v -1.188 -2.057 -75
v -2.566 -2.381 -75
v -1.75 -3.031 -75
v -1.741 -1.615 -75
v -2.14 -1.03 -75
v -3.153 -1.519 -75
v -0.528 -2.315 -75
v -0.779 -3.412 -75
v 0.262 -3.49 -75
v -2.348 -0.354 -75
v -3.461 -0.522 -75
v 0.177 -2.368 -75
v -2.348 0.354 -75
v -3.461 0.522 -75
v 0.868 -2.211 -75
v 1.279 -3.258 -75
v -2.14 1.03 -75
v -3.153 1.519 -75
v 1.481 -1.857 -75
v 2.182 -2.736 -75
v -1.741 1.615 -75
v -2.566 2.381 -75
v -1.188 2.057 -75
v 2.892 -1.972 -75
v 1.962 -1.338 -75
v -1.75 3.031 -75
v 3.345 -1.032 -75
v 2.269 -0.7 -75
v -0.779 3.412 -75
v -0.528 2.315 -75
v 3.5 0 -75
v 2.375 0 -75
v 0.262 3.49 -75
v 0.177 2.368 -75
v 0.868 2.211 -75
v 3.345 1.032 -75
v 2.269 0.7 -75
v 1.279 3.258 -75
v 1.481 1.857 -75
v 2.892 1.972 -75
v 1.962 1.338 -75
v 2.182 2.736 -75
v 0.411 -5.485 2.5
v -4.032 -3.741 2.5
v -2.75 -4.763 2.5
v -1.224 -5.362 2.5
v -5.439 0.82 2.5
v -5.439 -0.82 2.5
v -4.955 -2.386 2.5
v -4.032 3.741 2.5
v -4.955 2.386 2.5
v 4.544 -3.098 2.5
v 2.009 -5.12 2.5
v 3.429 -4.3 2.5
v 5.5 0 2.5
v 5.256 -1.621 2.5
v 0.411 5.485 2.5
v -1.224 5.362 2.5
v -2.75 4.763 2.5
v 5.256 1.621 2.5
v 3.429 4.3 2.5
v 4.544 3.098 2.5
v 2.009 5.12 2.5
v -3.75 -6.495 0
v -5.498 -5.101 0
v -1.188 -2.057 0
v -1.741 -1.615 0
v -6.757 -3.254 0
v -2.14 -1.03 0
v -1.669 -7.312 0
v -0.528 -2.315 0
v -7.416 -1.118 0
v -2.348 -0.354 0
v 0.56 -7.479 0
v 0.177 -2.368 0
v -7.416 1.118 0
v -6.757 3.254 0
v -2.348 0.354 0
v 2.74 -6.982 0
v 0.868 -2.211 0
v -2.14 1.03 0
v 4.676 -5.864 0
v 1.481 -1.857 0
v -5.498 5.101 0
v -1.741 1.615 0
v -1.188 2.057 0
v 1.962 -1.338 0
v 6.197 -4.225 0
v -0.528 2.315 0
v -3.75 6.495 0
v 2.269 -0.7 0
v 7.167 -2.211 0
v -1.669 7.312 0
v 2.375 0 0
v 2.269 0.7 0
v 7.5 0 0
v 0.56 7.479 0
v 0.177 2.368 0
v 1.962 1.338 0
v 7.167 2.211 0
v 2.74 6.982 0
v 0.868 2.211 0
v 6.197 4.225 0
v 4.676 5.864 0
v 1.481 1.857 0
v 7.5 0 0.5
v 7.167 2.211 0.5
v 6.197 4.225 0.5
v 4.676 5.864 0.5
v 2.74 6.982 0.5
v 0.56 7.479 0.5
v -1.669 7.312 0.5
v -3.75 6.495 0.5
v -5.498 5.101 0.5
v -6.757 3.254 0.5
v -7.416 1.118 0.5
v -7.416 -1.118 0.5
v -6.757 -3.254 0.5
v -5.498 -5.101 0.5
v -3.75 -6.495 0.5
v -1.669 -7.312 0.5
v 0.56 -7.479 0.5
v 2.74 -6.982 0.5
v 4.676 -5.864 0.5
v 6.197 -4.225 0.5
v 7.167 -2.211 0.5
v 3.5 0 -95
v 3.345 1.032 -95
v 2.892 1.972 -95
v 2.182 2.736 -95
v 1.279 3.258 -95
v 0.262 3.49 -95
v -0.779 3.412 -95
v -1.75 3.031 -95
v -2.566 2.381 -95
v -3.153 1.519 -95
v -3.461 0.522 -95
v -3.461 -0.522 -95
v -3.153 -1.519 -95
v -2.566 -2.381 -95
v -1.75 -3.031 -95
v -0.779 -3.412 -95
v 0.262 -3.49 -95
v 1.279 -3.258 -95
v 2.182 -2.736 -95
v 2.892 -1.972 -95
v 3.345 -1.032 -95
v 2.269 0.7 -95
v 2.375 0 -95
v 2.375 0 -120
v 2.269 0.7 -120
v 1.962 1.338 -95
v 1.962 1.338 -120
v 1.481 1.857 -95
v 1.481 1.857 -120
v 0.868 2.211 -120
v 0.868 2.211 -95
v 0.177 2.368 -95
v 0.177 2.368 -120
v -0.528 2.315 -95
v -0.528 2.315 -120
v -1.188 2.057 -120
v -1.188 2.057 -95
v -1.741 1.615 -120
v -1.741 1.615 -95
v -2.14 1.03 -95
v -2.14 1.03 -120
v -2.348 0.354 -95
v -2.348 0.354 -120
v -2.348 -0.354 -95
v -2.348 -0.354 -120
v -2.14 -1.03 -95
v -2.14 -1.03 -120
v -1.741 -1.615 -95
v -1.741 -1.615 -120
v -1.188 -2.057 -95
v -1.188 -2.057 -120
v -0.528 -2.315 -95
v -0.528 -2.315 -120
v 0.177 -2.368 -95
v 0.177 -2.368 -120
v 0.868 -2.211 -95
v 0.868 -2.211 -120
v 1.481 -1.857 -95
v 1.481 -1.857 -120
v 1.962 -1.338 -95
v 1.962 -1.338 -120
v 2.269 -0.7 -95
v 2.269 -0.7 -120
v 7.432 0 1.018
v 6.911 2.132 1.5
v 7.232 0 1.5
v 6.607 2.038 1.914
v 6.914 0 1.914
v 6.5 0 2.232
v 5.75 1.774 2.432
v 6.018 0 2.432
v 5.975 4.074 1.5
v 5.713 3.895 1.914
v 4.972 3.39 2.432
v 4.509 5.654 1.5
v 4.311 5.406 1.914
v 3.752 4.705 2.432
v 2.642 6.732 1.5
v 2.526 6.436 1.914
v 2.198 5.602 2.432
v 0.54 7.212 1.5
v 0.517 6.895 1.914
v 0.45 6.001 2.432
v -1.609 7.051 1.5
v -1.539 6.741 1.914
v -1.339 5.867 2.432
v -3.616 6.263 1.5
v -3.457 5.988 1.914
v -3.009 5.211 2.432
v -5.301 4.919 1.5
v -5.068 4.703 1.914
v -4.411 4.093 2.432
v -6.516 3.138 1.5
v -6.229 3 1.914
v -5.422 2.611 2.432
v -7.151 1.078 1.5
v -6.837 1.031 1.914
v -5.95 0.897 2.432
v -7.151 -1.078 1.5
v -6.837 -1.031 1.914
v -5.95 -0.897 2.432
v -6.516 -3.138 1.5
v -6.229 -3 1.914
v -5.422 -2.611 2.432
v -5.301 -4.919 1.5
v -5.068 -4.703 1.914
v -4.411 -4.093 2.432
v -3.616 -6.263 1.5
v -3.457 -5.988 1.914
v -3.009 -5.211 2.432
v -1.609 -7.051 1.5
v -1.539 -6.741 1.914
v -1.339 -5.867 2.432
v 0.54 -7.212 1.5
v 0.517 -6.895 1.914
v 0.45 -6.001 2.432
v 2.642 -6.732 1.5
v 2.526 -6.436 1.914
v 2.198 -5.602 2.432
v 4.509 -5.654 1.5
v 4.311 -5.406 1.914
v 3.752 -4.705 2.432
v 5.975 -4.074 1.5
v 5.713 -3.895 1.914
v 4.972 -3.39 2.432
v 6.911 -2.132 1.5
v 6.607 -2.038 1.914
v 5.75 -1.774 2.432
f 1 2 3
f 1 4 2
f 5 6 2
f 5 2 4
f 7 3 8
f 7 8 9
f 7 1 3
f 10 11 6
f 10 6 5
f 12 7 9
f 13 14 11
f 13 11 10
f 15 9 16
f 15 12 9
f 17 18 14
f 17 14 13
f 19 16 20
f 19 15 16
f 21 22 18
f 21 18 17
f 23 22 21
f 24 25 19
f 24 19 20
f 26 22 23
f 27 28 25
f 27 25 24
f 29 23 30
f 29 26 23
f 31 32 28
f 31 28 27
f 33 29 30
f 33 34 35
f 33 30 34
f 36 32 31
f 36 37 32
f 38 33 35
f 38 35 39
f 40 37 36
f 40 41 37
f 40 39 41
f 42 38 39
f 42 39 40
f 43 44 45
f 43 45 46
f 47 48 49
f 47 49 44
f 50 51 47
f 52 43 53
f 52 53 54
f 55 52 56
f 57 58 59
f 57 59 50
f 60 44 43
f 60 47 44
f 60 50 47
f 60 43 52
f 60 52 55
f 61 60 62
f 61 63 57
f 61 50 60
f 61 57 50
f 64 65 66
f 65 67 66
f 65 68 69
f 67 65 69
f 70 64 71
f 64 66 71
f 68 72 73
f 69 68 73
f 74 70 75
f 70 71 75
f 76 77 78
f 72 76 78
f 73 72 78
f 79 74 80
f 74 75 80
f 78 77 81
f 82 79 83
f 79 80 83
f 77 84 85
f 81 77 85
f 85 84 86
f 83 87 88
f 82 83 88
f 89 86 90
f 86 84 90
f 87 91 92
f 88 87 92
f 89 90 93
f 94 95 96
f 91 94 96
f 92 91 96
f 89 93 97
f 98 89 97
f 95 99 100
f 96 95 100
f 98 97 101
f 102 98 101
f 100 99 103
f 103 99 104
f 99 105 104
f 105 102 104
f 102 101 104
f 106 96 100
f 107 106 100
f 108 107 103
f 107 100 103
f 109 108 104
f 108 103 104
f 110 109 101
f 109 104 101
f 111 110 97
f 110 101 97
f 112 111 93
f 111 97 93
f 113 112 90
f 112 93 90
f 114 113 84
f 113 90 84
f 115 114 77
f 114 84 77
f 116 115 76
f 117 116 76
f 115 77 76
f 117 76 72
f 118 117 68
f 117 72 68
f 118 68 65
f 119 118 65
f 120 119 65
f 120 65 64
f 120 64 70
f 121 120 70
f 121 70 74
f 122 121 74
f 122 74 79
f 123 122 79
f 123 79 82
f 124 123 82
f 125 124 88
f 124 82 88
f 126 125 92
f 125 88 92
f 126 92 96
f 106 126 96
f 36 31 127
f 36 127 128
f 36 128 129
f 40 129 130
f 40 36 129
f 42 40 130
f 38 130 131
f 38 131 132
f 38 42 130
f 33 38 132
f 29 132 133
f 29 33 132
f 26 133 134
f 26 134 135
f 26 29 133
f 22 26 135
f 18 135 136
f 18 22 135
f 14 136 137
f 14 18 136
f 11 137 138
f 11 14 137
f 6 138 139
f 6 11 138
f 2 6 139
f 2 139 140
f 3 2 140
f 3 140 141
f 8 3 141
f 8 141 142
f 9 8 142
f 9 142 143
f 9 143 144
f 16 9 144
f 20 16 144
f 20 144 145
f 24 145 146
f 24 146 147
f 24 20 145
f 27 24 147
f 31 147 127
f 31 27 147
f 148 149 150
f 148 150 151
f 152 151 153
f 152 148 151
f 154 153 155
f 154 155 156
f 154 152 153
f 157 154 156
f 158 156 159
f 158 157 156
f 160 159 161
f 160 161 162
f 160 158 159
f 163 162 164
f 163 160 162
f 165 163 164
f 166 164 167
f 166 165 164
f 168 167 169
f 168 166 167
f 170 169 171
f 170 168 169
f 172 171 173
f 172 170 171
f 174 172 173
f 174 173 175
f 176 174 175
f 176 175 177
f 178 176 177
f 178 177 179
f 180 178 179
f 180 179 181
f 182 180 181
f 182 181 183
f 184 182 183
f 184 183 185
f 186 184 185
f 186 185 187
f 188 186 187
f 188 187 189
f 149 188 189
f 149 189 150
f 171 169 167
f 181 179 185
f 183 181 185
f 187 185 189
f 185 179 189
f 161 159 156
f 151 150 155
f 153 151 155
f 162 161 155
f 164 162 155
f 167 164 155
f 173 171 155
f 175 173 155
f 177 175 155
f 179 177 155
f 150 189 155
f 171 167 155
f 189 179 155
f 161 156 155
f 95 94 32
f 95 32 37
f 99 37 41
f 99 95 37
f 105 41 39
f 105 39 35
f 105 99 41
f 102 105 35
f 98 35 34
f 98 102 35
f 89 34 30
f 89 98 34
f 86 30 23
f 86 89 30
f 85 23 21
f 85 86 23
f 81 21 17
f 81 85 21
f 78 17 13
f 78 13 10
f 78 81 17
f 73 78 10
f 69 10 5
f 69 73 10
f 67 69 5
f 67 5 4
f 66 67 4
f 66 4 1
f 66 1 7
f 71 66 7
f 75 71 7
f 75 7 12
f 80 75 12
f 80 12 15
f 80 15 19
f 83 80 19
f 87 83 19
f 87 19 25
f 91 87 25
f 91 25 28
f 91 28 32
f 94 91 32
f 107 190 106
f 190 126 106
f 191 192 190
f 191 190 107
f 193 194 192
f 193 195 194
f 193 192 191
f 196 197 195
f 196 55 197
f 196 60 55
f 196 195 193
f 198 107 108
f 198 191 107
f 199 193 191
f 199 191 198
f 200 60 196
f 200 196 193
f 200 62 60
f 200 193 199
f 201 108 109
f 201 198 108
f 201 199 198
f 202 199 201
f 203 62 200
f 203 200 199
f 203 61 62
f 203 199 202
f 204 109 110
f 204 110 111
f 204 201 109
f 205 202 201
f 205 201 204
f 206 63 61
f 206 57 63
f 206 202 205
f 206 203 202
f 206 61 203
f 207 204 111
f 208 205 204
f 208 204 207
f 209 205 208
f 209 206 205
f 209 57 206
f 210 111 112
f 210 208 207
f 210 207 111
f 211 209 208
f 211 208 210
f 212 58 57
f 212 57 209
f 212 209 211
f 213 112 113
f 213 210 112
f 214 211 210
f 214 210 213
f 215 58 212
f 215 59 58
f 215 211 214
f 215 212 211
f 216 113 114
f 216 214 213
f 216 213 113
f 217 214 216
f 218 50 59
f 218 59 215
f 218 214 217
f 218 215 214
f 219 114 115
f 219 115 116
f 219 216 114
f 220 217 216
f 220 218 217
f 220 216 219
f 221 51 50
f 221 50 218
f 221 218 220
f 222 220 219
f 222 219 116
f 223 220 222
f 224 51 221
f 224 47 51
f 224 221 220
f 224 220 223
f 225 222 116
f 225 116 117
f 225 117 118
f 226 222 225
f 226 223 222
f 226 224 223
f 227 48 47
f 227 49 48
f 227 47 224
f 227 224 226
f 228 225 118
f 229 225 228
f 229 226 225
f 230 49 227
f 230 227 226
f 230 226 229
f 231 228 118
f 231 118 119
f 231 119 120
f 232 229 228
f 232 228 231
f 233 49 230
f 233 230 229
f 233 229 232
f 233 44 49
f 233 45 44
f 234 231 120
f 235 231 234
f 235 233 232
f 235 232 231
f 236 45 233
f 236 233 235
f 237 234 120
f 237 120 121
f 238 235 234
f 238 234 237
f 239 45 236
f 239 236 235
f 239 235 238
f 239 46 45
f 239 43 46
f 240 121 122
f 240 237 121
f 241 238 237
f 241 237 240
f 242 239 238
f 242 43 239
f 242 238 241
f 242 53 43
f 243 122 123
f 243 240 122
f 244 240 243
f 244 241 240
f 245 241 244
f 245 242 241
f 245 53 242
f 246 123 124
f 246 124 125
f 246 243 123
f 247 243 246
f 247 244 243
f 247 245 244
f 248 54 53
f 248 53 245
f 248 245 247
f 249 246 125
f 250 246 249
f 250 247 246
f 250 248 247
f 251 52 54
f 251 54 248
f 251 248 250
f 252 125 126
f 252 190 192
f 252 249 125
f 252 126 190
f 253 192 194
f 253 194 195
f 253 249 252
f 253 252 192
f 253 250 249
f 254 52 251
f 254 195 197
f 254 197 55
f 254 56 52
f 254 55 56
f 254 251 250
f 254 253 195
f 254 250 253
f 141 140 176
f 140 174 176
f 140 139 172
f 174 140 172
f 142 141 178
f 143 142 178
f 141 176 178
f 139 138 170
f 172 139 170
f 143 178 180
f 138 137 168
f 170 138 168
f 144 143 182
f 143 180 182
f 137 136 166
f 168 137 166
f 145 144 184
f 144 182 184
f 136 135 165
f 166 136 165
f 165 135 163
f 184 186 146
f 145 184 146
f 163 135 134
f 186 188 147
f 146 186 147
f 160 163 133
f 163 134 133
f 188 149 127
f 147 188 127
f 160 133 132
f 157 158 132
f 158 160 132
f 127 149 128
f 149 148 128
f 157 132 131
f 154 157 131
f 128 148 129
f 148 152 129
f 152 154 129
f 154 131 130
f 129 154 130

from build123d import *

# Parameters (mm, degrees)
SKETCH1_R           = 7.5
BOSS_EXTRUDE1_DEPTH = 2.5
SKETCH1_3_R         = 2.375
BOSS_EXTRUDE2_DEPTH = 120
BOSS_EXTRUDE3_START = -75
SKETCH1_4_R         = 3.5
SKETCH1_4_R_2       = 2.375
BOSS_EXTRUDE3_DEPTH = 20
FILLET1_R           = 2


with BuildPart() as part:
    # Sketch1 → Boss-Extrude1 (new body)
    with BuildSketch(Plane.XY):
        Circle(SKETCH1_R)
    extrude(amount=BOSS_EXTRUDE1_DEPTH)

    # Sketch1_3 → Boss-Extrude2 (add)
    with BuildSketch(Plane.XY):
        Circle(SKETCH1_3_R)
    extrude(amount=-BOSS_EXTRUDE2_DEPTH)

    # Sketch1_4 → Boss-Extrude3 (add)
    with BuildSketch(Plane.XY.offset(BOSS_EXTRUDE3_START)):
        Circle(SKETCH1_4_R)
        Circle(SKETCH1_4_R_2, mode=Mode.SUBTRACT)
    extrude(amount=-BOSS_EXTRUDE3_DEPTH)

    # Fillet1
    fillet1_edges = [part.edges().sort_by_distance(p)[0] for p in [
        (-7.5, 0, 2.5),
    ]]
    fillet(fillet1_edges, radius=FILLET1_R)


solid = part.part
